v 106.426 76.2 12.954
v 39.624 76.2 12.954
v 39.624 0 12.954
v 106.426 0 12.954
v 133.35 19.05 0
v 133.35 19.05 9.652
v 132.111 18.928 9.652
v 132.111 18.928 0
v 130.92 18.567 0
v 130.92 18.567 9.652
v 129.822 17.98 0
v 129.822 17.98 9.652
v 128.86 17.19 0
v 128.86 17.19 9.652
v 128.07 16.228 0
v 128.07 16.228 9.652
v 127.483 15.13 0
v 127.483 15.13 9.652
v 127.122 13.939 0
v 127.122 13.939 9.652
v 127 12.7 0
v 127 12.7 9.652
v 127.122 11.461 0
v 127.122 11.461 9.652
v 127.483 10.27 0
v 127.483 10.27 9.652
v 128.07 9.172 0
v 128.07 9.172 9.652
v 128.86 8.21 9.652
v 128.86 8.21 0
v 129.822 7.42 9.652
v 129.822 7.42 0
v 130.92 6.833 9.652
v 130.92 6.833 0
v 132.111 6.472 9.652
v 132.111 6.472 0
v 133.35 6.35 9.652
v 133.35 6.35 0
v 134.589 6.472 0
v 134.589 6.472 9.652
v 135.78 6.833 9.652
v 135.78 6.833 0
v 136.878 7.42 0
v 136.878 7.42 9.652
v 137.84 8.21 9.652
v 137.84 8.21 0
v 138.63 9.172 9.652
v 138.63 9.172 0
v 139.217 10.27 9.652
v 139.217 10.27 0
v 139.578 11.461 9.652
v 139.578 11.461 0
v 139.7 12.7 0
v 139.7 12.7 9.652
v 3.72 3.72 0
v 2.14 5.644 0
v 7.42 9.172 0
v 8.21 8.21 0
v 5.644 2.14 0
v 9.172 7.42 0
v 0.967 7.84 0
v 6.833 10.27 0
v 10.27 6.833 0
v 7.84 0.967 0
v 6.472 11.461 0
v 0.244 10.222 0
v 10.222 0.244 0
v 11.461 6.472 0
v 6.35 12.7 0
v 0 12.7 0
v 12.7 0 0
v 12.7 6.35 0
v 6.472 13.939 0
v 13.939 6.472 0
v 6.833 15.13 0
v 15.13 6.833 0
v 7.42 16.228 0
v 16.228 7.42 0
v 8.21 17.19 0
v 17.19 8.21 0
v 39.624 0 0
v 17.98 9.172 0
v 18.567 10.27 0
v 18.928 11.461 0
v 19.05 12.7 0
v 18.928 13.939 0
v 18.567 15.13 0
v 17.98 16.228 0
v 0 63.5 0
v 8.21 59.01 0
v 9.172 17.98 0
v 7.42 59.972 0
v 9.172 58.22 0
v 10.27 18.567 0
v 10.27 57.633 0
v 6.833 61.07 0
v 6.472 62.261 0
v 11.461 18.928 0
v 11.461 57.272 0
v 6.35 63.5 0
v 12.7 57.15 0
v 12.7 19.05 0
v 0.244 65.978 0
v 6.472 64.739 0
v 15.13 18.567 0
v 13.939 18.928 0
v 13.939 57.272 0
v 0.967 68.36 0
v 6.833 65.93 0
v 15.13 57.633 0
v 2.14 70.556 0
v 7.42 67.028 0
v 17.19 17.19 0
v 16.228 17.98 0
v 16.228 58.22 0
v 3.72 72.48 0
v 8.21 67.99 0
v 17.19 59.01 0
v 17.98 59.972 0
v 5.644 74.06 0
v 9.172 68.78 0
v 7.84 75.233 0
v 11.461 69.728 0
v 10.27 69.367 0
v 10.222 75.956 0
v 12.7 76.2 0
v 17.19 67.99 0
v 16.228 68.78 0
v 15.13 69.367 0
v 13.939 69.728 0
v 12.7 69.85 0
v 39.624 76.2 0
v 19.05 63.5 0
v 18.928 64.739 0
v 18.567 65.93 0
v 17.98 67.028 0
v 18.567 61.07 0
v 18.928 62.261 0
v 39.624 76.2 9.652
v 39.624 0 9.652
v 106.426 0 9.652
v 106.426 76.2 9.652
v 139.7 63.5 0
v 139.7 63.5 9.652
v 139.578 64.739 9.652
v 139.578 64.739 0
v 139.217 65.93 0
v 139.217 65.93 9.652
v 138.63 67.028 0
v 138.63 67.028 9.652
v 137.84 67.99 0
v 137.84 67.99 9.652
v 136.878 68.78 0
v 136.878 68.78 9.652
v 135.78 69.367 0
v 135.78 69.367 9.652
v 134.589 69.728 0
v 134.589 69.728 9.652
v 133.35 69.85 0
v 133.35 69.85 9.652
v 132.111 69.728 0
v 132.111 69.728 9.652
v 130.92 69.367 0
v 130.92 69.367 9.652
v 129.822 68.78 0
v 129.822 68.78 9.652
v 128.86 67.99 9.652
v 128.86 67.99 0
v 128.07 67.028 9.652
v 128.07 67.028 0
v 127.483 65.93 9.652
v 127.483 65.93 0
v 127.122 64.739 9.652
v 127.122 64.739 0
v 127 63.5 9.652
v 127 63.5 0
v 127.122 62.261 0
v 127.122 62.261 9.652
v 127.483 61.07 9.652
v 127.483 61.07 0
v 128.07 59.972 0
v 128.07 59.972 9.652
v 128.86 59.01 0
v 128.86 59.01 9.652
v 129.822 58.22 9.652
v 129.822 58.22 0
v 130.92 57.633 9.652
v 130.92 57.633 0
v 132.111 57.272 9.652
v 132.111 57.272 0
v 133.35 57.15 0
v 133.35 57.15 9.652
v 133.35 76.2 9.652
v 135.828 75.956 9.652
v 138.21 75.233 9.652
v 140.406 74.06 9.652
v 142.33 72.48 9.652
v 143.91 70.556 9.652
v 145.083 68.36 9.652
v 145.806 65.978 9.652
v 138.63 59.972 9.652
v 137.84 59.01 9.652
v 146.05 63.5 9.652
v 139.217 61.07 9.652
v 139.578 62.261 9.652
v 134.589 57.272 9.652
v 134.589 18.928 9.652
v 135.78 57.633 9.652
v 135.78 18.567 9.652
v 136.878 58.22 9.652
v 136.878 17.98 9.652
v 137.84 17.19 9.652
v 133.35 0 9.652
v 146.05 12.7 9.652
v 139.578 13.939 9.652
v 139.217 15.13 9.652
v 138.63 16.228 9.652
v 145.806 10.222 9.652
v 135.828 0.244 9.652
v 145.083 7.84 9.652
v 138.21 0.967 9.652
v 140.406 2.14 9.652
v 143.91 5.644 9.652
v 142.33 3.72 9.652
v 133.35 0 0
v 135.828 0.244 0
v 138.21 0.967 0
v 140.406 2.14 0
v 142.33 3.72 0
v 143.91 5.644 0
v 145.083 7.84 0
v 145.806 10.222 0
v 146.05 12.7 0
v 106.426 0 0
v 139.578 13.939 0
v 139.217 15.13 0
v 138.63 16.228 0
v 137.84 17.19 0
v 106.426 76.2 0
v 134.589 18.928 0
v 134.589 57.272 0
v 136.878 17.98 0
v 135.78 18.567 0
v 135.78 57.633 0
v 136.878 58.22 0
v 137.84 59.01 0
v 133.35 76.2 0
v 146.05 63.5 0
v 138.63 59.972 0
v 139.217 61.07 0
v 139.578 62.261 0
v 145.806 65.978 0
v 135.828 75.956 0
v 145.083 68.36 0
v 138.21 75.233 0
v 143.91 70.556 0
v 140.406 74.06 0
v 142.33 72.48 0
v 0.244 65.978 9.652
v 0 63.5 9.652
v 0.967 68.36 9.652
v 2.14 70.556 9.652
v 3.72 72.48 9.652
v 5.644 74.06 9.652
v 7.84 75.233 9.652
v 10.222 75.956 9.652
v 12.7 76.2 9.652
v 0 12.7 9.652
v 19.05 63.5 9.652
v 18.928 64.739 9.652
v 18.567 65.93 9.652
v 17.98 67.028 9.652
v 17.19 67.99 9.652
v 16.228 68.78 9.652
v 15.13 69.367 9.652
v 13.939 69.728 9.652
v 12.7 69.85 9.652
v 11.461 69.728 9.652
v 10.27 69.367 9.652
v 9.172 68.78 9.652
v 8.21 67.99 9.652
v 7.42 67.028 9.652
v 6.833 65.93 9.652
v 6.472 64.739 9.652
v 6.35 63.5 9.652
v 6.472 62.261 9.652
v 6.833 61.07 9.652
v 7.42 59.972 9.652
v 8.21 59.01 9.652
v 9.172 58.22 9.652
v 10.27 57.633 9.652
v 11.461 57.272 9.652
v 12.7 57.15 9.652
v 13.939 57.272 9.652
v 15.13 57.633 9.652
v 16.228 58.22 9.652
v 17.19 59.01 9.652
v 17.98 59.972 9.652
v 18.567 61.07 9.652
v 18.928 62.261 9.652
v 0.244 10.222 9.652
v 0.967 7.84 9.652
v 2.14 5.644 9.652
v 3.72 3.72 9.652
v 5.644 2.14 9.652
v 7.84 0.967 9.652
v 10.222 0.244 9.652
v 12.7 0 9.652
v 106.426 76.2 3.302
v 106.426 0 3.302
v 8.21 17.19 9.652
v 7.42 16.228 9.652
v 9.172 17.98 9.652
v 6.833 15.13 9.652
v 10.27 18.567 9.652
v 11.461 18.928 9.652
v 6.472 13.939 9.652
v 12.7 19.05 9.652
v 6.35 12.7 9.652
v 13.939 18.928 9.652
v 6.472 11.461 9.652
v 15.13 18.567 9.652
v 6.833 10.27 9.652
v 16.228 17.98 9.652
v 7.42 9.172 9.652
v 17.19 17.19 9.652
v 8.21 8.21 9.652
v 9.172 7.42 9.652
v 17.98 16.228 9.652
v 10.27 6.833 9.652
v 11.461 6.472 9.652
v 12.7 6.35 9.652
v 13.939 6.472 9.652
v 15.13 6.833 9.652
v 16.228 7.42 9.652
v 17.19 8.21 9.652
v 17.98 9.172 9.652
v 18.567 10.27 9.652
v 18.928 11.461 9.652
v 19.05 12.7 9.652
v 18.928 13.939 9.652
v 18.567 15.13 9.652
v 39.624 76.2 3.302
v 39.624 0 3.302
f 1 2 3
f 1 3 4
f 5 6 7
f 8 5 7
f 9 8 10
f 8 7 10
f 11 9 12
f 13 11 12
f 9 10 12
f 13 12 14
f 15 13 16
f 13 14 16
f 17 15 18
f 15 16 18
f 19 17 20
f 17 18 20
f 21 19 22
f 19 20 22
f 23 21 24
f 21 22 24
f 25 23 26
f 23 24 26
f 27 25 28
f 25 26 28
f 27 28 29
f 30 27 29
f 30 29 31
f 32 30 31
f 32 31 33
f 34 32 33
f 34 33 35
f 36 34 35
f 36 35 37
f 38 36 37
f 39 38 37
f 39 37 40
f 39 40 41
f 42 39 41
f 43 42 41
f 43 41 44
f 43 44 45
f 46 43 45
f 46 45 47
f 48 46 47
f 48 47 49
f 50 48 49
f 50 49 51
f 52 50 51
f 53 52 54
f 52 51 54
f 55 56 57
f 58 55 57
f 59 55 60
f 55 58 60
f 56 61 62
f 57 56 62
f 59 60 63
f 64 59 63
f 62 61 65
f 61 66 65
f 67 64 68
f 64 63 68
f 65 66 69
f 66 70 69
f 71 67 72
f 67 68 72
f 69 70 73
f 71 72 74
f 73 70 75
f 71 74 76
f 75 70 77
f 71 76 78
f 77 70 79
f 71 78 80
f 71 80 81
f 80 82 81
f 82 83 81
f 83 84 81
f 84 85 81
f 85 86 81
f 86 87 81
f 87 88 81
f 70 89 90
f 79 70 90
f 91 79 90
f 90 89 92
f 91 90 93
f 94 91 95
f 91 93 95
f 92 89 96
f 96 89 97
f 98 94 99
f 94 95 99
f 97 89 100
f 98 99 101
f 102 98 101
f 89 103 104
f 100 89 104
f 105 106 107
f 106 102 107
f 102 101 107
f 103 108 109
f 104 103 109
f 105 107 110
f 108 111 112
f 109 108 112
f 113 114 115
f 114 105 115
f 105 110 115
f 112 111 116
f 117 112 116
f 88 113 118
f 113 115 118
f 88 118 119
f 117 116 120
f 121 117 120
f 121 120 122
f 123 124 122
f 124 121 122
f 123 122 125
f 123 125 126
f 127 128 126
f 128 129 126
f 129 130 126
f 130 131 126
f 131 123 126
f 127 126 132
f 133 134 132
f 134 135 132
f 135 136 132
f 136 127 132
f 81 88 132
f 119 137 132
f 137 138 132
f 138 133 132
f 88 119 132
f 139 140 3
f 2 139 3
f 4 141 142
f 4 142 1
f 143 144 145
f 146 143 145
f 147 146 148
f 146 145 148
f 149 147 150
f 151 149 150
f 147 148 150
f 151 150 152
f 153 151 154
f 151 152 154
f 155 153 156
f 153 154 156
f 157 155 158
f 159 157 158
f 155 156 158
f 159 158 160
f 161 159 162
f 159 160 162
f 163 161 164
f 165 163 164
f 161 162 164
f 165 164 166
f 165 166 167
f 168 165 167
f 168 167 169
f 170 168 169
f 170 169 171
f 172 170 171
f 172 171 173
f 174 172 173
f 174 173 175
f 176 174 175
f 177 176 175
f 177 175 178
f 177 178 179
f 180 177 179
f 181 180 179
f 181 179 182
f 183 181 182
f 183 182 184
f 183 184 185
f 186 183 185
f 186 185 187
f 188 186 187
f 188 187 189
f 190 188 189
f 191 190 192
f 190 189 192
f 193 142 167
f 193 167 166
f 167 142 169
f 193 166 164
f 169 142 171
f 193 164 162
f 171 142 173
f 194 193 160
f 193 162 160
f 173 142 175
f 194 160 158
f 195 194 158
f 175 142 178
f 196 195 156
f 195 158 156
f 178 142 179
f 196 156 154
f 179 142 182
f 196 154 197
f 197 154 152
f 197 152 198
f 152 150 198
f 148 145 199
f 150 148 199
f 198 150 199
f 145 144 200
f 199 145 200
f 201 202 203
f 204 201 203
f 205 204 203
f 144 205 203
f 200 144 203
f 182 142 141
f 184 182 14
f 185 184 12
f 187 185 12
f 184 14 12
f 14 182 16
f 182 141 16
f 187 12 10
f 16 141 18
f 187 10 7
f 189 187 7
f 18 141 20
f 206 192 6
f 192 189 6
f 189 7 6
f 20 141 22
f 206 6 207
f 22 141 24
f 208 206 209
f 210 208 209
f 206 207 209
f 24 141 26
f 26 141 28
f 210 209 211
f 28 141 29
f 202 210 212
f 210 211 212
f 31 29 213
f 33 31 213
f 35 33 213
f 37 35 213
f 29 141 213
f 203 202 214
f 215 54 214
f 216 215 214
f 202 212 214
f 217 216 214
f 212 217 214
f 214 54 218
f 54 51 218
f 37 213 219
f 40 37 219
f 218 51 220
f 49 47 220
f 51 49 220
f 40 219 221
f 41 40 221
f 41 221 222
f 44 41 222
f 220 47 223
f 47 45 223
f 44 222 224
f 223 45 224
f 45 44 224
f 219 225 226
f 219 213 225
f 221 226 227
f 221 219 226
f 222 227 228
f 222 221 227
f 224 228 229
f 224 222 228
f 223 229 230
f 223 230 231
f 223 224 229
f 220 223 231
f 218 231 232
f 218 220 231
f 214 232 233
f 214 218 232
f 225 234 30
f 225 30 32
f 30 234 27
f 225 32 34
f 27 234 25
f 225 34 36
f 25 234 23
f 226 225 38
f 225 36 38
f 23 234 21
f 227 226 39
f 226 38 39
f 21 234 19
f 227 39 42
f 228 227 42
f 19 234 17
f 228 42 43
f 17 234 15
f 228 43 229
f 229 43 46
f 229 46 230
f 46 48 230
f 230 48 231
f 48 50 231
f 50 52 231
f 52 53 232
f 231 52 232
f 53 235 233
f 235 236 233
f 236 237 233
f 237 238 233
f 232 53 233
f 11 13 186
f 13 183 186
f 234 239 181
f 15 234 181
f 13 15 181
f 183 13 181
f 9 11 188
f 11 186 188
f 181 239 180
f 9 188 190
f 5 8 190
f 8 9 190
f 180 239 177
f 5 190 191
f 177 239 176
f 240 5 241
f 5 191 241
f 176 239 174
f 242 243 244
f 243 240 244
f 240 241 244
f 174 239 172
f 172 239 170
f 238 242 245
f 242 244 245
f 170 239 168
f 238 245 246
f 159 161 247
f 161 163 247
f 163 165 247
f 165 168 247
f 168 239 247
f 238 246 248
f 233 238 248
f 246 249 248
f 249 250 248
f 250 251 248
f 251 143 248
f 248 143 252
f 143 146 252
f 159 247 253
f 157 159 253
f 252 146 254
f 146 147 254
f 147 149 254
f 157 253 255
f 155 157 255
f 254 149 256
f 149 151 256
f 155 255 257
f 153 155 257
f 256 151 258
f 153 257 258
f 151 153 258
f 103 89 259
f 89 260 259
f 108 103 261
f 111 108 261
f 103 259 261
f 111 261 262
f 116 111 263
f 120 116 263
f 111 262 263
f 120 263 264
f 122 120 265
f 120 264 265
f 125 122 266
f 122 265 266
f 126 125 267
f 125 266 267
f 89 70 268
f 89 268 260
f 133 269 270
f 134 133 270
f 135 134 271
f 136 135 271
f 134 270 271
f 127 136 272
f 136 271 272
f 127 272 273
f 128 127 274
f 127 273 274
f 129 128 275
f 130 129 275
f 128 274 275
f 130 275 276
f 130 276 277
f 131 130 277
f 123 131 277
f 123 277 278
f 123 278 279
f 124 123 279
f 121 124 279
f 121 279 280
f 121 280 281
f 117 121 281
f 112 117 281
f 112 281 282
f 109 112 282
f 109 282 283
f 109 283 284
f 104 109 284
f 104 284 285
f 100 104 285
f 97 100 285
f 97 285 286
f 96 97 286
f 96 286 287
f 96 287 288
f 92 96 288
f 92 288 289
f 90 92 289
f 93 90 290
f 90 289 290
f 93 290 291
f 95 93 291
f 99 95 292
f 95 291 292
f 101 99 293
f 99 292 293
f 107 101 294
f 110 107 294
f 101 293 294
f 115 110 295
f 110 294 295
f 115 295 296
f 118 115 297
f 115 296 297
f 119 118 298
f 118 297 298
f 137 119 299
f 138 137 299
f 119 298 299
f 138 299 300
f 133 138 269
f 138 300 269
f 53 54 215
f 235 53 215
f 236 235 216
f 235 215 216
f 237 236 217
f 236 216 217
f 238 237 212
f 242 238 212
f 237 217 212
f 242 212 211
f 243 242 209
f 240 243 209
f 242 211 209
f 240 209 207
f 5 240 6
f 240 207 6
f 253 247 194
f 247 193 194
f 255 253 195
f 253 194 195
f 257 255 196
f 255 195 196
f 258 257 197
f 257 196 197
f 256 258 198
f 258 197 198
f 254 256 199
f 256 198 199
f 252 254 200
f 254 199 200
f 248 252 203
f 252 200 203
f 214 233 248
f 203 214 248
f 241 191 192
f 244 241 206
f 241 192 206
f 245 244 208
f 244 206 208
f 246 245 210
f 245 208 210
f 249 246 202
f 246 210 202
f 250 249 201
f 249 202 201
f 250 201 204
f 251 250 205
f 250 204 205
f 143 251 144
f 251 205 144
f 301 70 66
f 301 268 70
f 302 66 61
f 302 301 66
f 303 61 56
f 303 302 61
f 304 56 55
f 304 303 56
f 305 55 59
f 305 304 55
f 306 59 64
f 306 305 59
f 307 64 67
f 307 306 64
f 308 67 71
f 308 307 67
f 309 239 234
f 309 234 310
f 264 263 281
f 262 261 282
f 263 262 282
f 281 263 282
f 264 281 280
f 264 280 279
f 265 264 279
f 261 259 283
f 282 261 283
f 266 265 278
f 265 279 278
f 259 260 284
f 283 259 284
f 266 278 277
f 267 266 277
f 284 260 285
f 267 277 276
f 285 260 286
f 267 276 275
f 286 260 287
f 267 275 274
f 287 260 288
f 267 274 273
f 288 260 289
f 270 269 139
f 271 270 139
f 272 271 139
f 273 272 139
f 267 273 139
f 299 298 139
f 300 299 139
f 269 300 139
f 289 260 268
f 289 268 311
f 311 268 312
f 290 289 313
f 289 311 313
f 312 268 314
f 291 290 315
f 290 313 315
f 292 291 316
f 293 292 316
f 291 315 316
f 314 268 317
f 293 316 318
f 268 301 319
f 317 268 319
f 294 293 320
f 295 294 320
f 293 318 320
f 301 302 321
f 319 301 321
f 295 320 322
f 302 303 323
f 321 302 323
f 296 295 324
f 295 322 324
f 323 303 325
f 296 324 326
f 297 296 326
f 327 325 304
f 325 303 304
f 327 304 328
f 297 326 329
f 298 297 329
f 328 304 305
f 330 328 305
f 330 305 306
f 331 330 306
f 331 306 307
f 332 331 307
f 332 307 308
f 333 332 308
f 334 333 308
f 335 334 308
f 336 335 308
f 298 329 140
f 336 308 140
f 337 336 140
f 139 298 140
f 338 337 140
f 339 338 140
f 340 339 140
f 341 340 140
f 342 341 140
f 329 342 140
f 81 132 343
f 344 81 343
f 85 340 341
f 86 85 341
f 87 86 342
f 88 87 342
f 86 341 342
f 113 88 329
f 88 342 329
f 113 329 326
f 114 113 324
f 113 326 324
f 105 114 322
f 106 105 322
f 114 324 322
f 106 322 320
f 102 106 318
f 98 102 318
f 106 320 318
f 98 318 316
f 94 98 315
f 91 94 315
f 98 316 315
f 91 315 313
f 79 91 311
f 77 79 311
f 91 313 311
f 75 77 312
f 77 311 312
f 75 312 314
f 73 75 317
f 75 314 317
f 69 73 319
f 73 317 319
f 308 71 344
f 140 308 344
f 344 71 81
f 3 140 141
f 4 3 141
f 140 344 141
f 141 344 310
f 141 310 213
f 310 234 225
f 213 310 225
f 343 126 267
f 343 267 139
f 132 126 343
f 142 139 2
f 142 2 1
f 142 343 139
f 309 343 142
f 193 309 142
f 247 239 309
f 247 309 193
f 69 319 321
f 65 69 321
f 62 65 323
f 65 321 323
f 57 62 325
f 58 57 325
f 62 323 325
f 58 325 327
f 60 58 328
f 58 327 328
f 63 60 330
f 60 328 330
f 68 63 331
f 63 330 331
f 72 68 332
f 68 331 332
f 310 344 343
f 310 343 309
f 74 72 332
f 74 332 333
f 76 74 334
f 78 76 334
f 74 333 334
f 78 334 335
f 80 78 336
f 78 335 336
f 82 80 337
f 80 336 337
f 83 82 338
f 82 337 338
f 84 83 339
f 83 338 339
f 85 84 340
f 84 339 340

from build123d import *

# Parameters (mm, degrees)
F0_W     = 146.05
F0_H     = 76.2
F1_DEPTH = 12.954
F2_W     = 39.624
F2_H     = 3.302
F3_DEPTH = 76.201
F4_W     = 66.802
F4_H     = 3.302
F5_DEPTH = 76.201
F6_R     = 12.7
F7_R     = 6.35
F9_DEPTH = 9.653


with BuildPart() as f1:
    # F0 (on Top) → F1 (new body)
    with BuildSketch(Plane.XY):
        with Locations((73.025, 38.1)):
            Rectangle(F0_W, F0_H)
    extrude(amount=F1_DEPTH)

    # F2 (on face) → F3 (cut, through all)
    with BuildSketch(Plane.XZ):
        with Locations((126.238, 11.303)):
            Rectangle(F2_W, F2_H)
        with Locations((19.812, 11.303)):
            Rectangle(F2_W, F2_H)
    extrude(amount=-F3_DEPTH, mode=Mode.SUBTRACT)

    # F4 (on face) → F5 (cut, through all)
    with BuildSketch(Plane.XZ):
        with Locations((73.025, 1.651)):
            Rectangle(F4_W, F4_H)
    extrude(amount=-F5_DEPTH, mode=Mode.SUBTRACT)

    # F6
    f6_edges = [f1.edges().sort_by_distance(p)[0] for p in [
        (0, 0, 4.826),
        (0, 76.2, 4.826),
        (146.05, 76.2, 4.826),
        (146.05, 0, 4.826),
    ]]
    fillet(f6_edges, radius=F6_R)

    # F8 (on face) + F7 (on face) → F9 (cut, through all)
    with BuildSketch(Plane.XY.offset(9.652)):
        with BuildLine():
            Line((133.35, 63.5), (139.7, 63.5))
            ThreePointArc((139.7, 63.5), (128.859872, 67.990128), (133.35, 57.15))
            Line((133.35, 57.15), (133.35, 63.5))
        make_face()
        with BuildLine():
            ThreePointArc((133.35, 57.15), (137.840128, 59.009872), (139.7, 63.5))
            Line((139.7, 63.5), (133.35, 63.5))
            Line((133.35, 63.5), (133.35, 57.15))
        make_face()
        with BuildLine():
            ThreePointArc((139.7, 12.7), (137.840128, 17.190128), (133.35, 19.05))
            ThreePointArc((133.35, 19.05), (128.859872, 8.209872), (139.7, 12.7))
        make_face()
    with BuildSketch(Plane.XY.offset(9.652)):
        with Locations((12.7, 63.5)):
            Circle(F7_R)
        with BuildLine():
            Line((12.7, 12.7), (12.7, 6.35))
            ThreePointArc((12.7, 6.35), (17.190128, 8.209872), (19.05, 12.7))
            ThreePointArc((19.05, 12.7), (12.7, 19.05), (6.35, 12.7))
            Line((6.35, 12.7), (12.7, 12.7))
        make_face()
        with BuildLine():
            ThreePointArc((6.35, 12.7), (8.209872, 8.209872), (12.7, 6.35))
            Line((12.7, 6.35), (12.7, 12.7))
            Line((12.7, 12.7), (6.35, 12.7))
        make_face()
    extrude(amount=-F9_DEPTH, mode=Mode.SUBTRACT)


solid = f1.part
